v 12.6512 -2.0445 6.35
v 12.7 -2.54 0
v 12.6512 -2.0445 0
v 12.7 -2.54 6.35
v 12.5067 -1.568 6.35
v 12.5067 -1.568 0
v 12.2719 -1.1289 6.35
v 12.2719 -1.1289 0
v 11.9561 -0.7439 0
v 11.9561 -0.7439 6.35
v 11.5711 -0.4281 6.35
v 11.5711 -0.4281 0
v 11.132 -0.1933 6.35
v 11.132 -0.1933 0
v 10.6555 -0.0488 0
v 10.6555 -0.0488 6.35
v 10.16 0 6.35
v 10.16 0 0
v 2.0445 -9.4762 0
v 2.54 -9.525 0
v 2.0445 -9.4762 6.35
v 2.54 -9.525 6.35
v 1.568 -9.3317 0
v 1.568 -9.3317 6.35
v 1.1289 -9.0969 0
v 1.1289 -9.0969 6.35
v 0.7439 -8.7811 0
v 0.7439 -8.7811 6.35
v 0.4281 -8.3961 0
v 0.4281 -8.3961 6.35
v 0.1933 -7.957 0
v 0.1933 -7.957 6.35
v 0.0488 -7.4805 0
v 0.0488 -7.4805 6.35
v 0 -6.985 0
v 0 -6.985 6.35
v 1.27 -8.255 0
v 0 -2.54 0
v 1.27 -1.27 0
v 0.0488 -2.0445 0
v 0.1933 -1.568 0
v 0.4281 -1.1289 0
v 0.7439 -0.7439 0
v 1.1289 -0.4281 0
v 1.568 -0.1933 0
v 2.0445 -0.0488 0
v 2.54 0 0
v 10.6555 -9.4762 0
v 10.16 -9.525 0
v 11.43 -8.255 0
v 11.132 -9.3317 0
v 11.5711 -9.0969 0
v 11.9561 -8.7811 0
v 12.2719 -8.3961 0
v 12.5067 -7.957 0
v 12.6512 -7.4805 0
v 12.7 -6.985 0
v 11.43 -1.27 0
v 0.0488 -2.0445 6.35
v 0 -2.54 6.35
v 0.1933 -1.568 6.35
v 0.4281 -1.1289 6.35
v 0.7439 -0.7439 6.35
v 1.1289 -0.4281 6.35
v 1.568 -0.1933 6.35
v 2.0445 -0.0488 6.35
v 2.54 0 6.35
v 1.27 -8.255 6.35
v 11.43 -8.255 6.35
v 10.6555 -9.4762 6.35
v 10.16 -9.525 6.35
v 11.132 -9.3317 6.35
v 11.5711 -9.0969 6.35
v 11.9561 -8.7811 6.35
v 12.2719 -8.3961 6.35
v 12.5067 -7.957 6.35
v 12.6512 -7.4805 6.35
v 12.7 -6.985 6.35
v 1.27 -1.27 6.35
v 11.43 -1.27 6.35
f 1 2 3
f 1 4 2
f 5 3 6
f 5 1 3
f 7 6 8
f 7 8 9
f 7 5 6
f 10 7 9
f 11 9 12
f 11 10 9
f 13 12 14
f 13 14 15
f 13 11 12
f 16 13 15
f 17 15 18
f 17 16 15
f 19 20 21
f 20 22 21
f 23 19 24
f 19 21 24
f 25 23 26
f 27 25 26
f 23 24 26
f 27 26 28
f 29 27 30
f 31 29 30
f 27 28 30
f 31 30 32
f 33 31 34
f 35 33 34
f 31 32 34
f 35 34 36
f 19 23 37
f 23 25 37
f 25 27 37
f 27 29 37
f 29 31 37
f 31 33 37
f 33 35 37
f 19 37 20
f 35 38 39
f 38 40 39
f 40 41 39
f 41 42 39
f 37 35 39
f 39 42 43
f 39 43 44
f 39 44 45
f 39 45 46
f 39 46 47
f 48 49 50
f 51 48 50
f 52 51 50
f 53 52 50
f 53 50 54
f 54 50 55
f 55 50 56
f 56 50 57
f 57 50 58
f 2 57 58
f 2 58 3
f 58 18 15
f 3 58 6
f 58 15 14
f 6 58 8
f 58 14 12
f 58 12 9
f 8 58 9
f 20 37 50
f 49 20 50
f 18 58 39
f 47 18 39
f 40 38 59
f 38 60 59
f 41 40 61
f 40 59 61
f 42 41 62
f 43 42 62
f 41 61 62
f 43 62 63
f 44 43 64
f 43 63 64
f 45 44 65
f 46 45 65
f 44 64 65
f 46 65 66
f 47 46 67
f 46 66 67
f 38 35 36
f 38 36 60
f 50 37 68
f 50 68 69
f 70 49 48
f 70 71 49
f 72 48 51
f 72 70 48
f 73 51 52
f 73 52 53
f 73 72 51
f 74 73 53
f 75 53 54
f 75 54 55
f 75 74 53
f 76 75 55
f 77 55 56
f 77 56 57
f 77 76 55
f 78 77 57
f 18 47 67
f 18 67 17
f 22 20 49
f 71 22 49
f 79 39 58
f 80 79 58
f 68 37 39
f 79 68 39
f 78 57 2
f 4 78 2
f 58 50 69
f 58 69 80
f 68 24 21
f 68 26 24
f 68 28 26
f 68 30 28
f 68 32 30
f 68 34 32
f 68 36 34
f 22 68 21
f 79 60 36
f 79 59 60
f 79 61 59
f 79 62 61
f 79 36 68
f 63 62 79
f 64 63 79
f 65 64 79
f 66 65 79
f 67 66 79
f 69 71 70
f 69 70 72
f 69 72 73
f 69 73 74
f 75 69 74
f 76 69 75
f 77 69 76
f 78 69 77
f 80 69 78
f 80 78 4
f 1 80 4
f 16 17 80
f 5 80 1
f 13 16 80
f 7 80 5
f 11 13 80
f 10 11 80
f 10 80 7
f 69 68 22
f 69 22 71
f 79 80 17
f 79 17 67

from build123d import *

# Parameters (mm, degrees)
F0_W     = 12.7
F0_H     = 9.525
F0_W_2   = 10.16
F0_H_2   = 6.985
F1_DEPTH = 6.35
F2_R     = 2.54
F3_R     = 2.54
F4_R     = 2.54


with BuildPart() as f1:
    # F0 (on Top) → F1 (new body)
    with BuildSketch(Plane.XY):
        with Locations((6.35, -4.7625)):
            Rectangle(F0_W, F0_H)
        with Locations((6.35, -4.7625)):
            Rectangle(F0_W_2, F0_H_2, mode=Mode.SUBTRACT)
    extrude(amount=F1_DEPTH)

    # F2
    f2_edges = [f1.edges().sort_by_distance(p)[0] for p in [
        (12.7, -9.525, 3.175),
    ]]
    fillet(f2_edges, radius=F2_R)

    # F3
    f3_edges = [f1.edges().sort_by_distance(p)[0] for p in [
        (0, -9.525, 3.175),
    ]]
    fillet(f3_edges, radius=F3_R)

    # F4
    f4_edges = [f1.edges().sort_by_distance(p)[0] for p in [
        (12.7, 0, 3.175),
        (0, 0, 3.175),
    ]]
    fillet(f4_edges, radius=F4_R)


solid = f1.part
